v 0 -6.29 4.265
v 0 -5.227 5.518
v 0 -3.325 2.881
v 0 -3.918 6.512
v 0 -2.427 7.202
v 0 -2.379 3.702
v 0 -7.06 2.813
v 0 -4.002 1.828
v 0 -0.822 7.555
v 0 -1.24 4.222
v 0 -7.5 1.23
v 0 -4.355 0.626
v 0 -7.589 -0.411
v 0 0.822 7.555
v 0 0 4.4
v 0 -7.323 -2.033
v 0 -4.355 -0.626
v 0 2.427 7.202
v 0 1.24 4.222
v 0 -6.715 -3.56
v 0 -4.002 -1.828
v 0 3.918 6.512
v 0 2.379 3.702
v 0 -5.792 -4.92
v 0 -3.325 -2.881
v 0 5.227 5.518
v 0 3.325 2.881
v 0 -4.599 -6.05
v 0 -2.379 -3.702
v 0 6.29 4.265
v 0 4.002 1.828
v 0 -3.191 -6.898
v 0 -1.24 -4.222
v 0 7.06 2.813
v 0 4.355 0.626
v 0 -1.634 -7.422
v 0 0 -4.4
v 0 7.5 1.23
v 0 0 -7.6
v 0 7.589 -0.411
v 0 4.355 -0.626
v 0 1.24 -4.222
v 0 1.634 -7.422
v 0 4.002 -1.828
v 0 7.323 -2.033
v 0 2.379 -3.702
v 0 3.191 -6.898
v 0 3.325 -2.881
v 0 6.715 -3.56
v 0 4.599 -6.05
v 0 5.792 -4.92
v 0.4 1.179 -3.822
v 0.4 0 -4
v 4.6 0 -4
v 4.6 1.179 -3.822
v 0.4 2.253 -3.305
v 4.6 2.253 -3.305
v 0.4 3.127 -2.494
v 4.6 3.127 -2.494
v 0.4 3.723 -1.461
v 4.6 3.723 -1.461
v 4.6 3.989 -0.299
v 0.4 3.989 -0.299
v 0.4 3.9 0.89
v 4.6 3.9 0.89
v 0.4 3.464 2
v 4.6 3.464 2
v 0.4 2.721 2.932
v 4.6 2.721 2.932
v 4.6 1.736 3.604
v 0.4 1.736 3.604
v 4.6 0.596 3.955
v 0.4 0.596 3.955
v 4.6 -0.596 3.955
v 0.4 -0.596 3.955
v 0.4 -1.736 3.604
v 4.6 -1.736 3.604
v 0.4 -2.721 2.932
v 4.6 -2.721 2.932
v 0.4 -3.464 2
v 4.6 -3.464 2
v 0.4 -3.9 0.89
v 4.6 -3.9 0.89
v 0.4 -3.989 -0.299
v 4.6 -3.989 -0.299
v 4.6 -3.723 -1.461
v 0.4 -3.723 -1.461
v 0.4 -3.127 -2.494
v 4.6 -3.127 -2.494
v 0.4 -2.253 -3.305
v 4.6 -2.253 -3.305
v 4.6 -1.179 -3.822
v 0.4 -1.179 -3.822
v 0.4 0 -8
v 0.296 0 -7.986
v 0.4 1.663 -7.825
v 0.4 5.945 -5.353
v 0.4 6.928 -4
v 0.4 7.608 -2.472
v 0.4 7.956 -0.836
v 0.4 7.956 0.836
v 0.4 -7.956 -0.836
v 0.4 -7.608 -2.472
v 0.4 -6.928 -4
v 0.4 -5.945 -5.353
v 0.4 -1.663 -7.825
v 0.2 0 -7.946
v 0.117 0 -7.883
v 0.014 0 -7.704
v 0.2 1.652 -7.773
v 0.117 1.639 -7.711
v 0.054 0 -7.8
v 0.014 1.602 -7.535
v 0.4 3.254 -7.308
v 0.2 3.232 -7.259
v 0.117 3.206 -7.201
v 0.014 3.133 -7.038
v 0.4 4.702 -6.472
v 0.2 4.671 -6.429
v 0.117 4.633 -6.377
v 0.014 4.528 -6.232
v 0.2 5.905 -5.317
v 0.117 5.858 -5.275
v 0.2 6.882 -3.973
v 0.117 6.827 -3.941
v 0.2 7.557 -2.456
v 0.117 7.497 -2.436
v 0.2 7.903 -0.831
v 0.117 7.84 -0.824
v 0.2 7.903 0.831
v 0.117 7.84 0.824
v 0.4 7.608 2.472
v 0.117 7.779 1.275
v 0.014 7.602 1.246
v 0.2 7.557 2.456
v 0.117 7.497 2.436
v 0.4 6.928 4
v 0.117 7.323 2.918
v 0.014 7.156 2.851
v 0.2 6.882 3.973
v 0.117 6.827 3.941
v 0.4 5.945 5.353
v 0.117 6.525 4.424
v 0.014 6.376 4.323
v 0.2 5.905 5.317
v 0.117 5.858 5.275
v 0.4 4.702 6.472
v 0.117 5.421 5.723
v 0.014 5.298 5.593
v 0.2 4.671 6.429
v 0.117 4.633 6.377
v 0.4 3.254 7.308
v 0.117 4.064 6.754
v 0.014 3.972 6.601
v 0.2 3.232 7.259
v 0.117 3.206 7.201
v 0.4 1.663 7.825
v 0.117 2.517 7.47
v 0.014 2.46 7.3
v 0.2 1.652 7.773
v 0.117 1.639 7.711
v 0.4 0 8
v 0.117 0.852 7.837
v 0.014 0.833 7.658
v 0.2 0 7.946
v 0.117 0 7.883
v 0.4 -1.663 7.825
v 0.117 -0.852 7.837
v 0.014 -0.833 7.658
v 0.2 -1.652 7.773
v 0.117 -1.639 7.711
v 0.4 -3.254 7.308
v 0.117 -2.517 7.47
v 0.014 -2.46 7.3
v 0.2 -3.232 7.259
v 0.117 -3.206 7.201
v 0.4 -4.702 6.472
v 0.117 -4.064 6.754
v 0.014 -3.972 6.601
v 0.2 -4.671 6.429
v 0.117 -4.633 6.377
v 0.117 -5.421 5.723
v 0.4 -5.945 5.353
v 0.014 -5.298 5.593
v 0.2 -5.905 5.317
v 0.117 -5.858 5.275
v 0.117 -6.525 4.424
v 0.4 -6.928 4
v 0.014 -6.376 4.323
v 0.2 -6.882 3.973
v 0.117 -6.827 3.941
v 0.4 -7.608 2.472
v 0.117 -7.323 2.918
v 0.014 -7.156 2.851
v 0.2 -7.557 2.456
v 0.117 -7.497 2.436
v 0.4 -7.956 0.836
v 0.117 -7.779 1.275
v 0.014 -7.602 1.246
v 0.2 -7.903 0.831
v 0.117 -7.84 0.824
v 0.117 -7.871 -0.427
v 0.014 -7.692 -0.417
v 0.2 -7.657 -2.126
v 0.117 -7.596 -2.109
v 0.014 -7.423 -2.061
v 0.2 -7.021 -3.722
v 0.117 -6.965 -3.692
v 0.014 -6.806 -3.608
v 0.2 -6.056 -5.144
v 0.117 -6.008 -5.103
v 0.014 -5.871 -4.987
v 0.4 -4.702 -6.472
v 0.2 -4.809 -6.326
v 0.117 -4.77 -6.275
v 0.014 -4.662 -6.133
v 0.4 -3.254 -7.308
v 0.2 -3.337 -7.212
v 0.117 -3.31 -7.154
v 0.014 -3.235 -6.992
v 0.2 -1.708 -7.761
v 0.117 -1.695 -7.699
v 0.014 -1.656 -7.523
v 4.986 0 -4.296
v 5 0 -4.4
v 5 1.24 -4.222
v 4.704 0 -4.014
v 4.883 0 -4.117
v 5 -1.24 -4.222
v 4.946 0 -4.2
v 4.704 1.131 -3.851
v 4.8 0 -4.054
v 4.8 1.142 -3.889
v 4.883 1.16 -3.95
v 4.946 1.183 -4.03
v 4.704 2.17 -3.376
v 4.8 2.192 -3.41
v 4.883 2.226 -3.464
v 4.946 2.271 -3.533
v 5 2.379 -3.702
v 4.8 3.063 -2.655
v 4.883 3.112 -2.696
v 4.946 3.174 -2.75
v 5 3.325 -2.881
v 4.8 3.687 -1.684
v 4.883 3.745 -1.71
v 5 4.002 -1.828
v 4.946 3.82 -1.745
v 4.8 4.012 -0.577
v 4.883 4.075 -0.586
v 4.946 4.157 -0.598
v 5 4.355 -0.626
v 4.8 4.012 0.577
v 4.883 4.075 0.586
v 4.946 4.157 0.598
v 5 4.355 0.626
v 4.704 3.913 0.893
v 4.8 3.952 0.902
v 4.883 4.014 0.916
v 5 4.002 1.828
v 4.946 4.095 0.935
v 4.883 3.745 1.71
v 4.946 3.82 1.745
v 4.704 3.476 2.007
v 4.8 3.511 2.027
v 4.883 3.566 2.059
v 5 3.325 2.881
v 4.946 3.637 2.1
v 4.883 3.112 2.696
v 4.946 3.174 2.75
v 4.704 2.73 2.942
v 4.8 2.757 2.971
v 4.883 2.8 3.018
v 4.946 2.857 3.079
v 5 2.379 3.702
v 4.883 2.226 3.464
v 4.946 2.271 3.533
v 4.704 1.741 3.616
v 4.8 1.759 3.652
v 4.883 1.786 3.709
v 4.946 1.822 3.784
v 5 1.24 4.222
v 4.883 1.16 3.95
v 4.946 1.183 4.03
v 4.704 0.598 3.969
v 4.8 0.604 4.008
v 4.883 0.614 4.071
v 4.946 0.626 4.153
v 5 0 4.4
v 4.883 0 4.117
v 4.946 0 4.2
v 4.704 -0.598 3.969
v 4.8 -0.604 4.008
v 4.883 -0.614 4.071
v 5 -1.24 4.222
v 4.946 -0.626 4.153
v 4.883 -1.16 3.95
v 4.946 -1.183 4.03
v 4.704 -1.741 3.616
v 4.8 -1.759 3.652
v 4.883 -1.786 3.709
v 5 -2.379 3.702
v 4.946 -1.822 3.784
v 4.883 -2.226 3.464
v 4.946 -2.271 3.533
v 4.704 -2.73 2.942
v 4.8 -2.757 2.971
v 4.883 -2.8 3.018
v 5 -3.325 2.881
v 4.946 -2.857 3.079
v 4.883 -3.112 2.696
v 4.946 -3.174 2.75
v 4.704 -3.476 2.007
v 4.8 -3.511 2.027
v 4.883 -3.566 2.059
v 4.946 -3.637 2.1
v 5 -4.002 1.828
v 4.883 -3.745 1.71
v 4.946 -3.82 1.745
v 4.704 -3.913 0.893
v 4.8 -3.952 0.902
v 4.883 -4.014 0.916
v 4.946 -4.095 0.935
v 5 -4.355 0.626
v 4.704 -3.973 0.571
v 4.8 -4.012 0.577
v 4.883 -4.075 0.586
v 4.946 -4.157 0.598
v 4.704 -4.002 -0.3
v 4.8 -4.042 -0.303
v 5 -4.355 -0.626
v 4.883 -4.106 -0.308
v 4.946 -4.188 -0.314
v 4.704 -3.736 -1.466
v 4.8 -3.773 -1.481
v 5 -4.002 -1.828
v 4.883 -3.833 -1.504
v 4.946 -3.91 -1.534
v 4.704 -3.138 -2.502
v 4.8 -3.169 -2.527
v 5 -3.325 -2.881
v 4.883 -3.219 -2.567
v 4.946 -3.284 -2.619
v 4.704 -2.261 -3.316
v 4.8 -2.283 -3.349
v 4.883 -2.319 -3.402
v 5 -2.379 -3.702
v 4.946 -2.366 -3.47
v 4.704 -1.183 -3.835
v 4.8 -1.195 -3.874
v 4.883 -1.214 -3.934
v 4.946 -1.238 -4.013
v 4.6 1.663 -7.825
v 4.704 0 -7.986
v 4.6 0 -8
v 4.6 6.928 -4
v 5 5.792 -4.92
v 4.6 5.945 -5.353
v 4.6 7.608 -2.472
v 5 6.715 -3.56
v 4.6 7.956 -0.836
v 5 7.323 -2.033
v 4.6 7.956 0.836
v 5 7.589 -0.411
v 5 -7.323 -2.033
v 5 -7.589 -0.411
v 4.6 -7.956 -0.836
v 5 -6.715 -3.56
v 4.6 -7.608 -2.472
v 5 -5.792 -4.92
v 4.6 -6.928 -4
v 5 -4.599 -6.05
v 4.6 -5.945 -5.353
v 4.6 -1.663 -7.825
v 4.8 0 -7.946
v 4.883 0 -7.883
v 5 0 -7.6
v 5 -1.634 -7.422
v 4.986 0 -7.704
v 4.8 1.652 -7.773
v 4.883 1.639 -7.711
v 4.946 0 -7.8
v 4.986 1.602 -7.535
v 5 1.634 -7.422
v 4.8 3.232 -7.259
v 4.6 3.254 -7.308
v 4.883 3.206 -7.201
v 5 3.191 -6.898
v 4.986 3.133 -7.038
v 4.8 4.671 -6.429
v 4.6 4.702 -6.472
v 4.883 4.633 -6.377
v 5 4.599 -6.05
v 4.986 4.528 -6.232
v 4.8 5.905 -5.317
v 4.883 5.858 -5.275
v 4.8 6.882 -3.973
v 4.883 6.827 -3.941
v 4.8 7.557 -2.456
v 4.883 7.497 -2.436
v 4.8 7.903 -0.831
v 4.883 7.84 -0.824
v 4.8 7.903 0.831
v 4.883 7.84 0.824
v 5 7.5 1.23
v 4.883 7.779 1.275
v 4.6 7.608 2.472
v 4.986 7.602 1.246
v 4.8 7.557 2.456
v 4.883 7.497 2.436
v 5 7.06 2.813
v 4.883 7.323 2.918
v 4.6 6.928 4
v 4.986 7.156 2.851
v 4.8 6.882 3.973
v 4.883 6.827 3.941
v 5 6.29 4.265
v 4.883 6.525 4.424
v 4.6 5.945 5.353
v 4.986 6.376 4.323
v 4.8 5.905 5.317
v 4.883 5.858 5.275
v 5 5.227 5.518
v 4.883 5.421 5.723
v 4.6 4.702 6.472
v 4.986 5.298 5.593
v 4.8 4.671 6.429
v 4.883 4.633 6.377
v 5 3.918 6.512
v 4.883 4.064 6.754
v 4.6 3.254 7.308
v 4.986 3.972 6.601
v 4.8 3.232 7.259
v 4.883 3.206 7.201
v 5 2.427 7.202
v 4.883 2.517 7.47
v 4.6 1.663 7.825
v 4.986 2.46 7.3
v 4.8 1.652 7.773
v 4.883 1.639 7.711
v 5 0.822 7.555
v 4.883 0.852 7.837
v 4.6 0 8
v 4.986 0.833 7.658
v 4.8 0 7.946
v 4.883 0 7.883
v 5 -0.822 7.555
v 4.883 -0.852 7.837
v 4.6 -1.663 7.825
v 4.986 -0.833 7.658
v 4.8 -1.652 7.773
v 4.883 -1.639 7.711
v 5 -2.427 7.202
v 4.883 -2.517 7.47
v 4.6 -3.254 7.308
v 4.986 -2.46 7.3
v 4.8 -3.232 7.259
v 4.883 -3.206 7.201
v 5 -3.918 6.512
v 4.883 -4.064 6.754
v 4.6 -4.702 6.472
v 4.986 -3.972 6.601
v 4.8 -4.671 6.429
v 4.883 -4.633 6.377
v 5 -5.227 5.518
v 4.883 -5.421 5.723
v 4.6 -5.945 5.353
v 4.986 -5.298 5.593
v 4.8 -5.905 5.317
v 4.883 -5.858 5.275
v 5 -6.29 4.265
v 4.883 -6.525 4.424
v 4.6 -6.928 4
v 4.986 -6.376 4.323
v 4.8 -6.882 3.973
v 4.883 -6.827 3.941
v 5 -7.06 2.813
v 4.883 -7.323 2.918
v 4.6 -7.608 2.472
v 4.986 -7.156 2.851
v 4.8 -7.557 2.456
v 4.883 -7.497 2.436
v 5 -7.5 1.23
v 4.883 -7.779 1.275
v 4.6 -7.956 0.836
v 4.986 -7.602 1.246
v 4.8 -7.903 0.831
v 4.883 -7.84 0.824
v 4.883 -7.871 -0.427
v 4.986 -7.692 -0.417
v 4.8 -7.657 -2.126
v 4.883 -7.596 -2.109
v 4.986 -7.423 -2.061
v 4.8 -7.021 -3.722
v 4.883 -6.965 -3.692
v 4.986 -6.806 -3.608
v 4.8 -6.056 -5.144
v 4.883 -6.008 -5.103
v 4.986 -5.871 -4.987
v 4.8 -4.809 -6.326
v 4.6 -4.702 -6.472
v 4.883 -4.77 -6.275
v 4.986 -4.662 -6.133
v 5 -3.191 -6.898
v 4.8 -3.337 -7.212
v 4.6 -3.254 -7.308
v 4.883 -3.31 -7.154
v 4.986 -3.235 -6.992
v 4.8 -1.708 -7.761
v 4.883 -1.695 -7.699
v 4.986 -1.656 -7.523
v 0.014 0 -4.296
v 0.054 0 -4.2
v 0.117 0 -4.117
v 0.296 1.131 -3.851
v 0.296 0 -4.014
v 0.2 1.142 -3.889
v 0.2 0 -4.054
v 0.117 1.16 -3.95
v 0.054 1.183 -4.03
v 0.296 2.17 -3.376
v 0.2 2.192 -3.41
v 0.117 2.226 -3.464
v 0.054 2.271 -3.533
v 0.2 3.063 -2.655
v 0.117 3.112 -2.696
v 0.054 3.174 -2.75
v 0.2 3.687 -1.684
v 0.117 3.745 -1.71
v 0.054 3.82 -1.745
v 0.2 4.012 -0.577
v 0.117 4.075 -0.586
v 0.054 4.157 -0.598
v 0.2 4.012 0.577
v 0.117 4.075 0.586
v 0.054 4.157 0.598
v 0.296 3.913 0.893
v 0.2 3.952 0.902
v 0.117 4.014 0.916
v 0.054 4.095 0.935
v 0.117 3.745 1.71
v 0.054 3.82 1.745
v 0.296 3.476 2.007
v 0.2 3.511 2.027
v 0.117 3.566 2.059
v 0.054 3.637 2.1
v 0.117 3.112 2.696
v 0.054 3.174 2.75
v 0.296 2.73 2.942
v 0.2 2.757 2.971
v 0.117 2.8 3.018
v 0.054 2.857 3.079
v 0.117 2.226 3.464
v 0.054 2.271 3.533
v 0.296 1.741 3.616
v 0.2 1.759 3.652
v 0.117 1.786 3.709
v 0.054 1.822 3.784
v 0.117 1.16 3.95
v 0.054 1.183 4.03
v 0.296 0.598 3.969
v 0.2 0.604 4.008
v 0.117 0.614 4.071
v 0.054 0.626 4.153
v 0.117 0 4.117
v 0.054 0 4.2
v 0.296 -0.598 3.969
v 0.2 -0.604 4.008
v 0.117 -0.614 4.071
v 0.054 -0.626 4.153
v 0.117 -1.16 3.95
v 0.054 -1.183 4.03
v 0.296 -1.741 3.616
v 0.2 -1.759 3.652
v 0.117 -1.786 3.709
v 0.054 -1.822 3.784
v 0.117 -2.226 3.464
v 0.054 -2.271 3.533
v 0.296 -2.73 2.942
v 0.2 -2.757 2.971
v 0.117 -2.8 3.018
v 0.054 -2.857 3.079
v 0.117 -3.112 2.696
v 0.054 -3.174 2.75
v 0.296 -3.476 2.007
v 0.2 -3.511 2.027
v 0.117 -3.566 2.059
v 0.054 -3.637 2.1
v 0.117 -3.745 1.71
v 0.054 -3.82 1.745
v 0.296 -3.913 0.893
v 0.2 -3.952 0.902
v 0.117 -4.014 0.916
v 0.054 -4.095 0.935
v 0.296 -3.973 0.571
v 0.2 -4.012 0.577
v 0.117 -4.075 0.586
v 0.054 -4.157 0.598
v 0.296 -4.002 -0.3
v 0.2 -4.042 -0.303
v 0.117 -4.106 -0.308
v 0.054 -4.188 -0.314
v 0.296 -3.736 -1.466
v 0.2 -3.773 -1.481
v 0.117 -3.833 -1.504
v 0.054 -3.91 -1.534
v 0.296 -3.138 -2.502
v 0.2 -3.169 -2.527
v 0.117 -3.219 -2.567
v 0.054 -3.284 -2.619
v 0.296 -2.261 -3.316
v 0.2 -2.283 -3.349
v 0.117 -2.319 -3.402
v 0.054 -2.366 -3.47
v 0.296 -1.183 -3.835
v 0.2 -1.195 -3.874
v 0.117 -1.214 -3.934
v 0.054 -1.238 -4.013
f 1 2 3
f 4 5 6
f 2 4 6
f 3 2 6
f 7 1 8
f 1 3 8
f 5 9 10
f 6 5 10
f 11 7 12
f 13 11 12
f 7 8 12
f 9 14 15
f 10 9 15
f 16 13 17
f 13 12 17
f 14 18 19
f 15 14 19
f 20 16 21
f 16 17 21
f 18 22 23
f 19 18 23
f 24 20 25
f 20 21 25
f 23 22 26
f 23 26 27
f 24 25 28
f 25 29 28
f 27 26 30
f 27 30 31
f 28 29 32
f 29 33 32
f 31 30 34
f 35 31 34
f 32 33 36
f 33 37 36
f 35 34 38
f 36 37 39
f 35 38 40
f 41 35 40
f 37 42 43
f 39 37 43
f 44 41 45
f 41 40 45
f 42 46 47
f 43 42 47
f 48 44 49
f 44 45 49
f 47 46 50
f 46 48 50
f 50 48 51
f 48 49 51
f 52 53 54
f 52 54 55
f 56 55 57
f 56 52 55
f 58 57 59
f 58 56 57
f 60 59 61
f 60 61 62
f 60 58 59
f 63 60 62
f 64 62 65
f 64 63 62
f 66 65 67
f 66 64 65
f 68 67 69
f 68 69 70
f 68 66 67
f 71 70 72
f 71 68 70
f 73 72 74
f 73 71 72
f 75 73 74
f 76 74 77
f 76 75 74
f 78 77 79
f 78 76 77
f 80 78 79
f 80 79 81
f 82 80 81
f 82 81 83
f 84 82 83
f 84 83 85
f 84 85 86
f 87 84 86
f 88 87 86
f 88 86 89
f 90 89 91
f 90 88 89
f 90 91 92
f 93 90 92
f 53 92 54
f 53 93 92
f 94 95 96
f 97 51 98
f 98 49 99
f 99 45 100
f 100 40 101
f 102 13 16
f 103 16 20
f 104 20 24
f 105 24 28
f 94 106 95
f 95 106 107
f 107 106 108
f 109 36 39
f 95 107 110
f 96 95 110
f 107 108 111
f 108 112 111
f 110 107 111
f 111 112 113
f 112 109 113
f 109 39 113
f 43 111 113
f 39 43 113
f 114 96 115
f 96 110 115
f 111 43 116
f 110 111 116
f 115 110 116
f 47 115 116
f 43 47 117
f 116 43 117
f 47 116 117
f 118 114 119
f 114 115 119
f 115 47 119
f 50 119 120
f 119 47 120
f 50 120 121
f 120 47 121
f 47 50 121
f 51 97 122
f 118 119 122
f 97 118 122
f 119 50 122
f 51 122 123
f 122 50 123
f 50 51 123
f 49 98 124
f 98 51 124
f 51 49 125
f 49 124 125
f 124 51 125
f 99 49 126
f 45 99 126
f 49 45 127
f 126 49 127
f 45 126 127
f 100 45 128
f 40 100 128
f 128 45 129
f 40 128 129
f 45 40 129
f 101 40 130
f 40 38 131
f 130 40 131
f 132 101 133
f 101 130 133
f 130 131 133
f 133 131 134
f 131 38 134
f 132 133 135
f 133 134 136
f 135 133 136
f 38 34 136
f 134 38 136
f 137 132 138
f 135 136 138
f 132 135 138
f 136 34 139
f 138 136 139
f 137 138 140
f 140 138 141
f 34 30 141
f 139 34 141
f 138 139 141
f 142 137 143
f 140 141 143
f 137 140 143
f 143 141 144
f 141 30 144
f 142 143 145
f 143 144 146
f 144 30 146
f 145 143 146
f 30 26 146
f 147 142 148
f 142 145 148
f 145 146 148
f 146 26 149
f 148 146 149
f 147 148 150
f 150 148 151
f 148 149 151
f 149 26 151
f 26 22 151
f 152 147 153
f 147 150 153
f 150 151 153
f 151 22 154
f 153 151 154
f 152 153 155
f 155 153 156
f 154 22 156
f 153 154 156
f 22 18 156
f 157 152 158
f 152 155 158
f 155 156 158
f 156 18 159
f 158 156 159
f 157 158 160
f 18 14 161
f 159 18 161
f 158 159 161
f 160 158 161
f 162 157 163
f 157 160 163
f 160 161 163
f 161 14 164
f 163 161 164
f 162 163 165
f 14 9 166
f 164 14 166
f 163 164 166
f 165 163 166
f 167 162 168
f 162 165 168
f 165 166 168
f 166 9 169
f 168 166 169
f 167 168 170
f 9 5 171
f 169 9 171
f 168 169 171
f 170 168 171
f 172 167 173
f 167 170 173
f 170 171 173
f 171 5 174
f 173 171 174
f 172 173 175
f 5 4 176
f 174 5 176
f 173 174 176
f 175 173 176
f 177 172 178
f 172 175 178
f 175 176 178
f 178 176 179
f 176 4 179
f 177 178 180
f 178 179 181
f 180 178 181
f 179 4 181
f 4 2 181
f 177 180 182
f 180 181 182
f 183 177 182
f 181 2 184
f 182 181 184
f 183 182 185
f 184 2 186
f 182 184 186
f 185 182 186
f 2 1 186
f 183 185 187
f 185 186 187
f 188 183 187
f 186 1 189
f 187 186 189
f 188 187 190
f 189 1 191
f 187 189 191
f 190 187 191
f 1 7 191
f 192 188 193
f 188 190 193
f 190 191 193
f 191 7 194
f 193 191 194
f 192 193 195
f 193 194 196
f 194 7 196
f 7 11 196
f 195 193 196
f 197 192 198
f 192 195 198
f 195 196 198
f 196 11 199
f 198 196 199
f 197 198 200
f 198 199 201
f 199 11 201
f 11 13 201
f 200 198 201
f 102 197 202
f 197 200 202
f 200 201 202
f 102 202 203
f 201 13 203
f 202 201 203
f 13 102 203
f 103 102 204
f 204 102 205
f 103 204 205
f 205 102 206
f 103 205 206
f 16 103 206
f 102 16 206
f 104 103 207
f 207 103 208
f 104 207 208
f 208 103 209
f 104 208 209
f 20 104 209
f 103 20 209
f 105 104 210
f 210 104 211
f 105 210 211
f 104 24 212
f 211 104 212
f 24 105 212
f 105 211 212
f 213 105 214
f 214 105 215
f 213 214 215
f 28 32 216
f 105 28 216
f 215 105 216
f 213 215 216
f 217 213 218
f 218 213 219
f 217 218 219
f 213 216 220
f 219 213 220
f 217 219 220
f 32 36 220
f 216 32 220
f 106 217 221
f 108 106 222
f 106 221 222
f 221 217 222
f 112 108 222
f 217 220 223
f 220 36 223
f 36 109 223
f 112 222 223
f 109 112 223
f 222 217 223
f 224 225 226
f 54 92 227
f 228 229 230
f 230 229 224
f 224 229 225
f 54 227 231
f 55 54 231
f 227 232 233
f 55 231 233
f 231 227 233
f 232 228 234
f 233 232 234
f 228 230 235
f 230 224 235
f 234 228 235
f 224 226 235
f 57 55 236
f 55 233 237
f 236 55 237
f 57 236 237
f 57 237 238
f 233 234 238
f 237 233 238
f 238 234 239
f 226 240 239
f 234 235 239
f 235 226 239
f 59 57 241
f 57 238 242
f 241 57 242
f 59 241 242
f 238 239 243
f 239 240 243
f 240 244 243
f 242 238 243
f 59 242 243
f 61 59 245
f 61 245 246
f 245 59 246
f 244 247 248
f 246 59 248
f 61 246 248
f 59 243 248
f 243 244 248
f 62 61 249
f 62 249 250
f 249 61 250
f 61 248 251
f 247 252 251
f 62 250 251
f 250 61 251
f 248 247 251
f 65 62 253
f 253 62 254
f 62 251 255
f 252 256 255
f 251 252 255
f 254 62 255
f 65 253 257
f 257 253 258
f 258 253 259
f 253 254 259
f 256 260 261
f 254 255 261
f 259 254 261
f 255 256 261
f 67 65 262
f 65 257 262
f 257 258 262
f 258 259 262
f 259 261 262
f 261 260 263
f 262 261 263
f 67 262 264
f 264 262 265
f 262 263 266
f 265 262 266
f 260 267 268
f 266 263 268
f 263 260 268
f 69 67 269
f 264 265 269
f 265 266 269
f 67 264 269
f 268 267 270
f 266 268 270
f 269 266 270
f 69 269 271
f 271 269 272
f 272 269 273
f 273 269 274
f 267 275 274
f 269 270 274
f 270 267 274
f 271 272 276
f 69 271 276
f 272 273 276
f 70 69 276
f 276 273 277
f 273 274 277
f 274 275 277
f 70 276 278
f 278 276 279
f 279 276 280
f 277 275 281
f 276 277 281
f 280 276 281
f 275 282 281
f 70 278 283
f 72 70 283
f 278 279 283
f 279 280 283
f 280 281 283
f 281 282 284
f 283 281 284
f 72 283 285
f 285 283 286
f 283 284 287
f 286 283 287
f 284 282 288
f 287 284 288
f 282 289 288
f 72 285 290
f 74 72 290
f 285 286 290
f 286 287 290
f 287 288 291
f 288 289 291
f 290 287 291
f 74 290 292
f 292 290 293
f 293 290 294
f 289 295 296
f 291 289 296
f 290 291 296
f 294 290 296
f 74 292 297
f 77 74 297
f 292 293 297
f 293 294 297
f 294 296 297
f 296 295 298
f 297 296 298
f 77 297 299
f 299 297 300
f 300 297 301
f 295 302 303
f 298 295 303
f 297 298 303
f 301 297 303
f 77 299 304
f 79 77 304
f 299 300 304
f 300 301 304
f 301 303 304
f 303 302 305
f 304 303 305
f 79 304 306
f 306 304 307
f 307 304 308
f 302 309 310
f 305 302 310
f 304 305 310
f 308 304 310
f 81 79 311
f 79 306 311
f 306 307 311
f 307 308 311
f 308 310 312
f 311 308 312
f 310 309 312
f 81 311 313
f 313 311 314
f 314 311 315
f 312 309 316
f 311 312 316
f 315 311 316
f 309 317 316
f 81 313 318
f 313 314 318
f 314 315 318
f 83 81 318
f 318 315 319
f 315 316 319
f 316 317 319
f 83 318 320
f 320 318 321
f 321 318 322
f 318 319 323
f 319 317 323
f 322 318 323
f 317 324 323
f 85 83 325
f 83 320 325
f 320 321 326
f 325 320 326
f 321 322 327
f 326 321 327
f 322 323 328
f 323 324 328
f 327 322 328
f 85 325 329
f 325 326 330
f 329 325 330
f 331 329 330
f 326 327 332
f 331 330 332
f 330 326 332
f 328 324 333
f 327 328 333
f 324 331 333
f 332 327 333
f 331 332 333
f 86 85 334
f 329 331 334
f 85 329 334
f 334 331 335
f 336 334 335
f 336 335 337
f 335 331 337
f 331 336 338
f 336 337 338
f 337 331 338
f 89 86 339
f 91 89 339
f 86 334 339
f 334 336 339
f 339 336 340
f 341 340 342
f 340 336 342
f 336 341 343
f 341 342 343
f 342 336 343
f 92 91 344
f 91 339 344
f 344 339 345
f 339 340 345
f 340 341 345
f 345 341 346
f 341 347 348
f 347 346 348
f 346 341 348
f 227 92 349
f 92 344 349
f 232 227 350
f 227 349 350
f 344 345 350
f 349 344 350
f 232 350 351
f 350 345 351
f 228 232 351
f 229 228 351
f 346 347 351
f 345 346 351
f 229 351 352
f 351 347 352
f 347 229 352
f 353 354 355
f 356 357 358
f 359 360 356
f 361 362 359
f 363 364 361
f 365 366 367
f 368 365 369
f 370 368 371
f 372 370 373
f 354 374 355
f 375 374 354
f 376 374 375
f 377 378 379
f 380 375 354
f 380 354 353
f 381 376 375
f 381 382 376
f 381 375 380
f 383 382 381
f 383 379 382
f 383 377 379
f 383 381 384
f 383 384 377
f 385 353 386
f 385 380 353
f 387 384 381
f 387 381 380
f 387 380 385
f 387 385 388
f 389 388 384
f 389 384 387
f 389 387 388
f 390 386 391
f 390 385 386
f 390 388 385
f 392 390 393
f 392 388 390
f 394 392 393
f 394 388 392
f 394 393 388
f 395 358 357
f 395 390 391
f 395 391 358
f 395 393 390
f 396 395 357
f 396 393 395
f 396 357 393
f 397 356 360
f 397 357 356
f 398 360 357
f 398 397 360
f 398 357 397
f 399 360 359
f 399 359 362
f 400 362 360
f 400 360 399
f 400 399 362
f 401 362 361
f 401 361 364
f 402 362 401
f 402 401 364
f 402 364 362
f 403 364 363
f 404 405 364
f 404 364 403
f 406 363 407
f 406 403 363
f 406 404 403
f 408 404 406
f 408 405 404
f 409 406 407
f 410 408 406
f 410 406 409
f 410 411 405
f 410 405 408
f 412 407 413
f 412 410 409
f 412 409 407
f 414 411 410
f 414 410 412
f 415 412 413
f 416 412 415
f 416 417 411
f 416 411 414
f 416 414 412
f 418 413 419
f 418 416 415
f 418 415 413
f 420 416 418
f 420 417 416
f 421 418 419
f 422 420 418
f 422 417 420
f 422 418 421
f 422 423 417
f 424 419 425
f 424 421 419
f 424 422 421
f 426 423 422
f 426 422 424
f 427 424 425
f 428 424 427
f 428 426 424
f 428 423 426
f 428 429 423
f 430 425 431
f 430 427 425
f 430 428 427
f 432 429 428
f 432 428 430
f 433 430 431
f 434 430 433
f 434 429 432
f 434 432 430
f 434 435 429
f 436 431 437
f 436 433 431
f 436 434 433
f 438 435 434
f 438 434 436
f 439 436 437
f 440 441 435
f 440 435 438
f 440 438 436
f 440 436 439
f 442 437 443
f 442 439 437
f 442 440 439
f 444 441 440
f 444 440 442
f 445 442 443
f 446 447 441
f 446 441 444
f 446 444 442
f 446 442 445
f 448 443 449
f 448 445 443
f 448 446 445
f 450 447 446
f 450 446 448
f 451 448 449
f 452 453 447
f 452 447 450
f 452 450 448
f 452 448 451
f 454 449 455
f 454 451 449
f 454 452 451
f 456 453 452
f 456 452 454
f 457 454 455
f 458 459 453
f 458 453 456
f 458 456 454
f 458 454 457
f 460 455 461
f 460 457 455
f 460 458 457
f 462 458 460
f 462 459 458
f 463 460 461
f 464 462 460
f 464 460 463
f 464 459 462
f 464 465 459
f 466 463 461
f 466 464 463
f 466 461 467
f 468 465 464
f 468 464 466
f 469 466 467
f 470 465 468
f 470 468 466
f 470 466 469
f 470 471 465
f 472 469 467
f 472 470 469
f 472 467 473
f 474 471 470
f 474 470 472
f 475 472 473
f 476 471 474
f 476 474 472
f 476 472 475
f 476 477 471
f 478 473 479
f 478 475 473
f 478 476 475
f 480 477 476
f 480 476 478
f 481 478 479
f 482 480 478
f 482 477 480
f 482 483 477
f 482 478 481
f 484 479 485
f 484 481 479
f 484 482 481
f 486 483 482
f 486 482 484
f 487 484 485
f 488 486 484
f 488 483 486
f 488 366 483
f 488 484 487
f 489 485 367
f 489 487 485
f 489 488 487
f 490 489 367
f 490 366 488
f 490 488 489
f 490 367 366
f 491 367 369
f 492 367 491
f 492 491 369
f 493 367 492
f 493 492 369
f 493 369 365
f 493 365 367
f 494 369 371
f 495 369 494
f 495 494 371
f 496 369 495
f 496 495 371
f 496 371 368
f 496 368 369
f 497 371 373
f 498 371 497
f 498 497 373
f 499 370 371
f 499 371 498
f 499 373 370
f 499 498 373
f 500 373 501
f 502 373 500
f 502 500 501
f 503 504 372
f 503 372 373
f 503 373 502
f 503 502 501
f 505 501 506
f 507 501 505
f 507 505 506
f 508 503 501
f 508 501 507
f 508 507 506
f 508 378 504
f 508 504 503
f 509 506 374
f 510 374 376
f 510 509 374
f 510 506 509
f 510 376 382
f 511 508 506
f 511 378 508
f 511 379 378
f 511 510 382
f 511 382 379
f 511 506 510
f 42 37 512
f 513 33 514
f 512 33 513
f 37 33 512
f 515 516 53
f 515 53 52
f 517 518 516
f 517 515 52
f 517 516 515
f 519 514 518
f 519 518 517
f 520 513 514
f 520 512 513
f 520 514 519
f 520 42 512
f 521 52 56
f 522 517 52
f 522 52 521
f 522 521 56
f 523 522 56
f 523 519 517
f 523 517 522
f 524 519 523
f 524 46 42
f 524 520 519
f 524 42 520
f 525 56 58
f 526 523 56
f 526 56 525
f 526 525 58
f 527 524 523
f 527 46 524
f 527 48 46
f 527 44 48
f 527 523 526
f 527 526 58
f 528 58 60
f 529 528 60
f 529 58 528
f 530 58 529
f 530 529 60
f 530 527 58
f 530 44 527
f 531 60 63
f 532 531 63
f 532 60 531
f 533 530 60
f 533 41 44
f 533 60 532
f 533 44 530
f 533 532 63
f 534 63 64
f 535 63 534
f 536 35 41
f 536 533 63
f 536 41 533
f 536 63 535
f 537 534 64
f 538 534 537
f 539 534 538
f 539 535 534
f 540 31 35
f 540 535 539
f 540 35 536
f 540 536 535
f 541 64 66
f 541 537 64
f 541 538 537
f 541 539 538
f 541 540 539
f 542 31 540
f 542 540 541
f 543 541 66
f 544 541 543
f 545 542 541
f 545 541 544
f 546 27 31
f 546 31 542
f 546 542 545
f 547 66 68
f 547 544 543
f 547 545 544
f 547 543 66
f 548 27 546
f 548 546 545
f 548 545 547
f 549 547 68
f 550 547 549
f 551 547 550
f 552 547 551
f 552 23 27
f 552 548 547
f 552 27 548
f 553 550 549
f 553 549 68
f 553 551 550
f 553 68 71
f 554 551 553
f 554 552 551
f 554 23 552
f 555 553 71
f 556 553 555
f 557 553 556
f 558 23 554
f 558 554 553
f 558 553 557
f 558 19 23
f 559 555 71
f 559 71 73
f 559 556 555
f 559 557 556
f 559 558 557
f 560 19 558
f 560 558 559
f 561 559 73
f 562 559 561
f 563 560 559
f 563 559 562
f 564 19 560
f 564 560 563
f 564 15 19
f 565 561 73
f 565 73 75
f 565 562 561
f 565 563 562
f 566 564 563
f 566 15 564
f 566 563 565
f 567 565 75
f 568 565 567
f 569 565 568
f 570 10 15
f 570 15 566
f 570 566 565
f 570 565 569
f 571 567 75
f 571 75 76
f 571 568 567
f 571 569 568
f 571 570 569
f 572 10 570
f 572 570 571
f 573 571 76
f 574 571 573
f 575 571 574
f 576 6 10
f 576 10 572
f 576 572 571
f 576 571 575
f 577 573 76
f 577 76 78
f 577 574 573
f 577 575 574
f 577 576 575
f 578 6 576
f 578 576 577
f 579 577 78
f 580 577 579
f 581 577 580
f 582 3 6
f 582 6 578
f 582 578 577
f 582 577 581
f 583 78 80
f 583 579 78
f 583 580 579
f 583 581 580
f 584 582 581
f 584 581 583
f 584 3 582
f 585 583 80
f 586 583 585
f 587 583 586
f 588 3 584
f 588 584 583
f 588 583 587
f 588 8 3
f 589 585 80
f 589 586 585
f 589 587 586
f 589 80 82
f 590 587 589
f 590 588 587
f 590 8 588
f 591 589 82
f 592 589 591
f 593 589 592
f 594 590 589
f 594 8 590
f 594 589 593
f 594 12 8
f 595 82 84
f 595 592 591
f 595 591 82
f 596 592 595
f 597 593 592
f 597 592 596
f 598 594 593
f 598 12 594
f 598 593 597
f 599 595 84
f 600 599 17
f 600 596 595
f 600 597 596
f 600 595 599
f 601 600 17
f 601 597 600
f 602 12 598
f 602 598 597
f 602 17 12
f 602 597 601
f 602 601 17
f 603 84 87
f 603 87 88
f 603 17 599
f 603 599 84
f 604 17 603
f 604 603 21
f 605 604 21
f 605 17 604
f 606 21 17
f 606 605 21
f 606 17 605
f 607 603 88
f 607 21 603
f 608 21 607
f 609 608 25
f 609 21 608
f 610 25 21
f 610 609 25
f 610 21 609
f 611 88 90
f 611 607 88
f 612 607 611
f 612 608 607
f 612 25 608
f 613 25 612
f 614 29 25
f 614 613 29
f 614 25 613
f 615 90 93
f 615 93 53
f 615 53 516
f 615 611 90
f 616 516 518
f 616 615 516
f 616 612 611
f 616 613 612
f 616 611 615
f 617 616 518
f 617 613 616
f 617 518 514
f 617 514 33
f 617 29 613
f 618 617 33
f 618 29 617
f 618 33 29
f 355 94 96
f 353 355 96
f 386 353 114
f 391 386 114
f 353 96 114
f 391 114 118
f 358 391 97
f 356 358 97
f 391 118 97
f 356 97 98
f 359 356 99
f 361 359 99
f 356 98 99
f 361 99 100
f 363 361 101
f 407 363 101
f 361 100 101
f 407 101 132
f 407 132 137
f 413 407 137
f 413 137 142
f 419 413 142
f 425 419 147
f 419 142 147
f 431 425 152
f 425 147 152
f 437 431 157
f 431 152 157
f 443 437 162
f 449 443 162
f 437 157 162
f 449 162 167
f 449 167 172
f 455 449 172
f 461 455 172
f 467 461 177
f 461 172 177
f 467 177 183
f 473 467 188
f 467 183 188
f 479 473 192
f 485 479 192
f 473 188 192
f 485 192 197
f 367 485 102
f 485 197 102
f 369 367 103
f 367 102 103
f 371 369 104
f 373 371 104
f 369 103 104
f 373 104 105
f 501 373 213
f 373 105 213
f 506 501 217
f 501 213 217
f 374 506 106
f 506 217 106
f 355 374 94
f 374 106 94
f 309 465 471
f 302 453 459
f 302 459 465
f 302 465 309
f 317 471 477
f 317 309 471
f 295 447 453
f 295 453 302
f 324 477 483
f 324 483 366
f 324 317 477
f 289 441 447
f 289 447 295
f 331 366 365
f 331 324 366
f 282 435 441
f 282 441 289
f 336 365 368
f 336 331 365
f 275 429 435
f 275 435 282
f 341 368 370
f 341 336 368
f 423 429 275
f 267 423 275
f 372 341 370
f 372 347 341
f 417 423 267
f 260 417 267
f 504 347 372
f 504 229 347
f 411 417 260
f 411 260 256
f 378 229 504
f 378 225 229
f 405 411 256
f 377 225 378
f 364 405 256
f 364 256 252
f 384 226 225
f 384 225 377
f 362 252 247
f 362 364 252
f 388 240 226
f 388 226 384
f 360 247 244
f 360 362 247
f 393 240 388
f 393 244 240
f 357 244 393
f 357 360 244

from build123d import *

# Parameters (mm, degrees)
CROQUIS1_R              = 8
CROQUIS1_R_2            = 4
SALIENTE_EXTRUIR1_DEPTH = 5
REDONDEO1_R             = 0.4


with BuildPart() as part:
    # Croquis1 → Saliente-Extruir1 (new body)
    with BuildSketch(Plane(origin=(0, 0, 0), x_dir=(0, 0, -1), z_dir=(1, 0, 0))):
        Circle(CROQUIS1_R)
        Circle(CROQUIS1_R_2, mode=Mode.SUBTRACT)
    extrude(amount=SALIENTE_EXTRUIR1_DEPTH)

    # Redondeo1
    redondeo1_edges = [part.edges().sort_by_distance(p)[0] for p in [
        (0, 0, 8),
        (5, 0, 8),
        (0, 0, 4),
        (5, 0, 4),
    ]]
    fillet(redondeo1_edges, radius=REDONDEO1_R)


solid = part.part
